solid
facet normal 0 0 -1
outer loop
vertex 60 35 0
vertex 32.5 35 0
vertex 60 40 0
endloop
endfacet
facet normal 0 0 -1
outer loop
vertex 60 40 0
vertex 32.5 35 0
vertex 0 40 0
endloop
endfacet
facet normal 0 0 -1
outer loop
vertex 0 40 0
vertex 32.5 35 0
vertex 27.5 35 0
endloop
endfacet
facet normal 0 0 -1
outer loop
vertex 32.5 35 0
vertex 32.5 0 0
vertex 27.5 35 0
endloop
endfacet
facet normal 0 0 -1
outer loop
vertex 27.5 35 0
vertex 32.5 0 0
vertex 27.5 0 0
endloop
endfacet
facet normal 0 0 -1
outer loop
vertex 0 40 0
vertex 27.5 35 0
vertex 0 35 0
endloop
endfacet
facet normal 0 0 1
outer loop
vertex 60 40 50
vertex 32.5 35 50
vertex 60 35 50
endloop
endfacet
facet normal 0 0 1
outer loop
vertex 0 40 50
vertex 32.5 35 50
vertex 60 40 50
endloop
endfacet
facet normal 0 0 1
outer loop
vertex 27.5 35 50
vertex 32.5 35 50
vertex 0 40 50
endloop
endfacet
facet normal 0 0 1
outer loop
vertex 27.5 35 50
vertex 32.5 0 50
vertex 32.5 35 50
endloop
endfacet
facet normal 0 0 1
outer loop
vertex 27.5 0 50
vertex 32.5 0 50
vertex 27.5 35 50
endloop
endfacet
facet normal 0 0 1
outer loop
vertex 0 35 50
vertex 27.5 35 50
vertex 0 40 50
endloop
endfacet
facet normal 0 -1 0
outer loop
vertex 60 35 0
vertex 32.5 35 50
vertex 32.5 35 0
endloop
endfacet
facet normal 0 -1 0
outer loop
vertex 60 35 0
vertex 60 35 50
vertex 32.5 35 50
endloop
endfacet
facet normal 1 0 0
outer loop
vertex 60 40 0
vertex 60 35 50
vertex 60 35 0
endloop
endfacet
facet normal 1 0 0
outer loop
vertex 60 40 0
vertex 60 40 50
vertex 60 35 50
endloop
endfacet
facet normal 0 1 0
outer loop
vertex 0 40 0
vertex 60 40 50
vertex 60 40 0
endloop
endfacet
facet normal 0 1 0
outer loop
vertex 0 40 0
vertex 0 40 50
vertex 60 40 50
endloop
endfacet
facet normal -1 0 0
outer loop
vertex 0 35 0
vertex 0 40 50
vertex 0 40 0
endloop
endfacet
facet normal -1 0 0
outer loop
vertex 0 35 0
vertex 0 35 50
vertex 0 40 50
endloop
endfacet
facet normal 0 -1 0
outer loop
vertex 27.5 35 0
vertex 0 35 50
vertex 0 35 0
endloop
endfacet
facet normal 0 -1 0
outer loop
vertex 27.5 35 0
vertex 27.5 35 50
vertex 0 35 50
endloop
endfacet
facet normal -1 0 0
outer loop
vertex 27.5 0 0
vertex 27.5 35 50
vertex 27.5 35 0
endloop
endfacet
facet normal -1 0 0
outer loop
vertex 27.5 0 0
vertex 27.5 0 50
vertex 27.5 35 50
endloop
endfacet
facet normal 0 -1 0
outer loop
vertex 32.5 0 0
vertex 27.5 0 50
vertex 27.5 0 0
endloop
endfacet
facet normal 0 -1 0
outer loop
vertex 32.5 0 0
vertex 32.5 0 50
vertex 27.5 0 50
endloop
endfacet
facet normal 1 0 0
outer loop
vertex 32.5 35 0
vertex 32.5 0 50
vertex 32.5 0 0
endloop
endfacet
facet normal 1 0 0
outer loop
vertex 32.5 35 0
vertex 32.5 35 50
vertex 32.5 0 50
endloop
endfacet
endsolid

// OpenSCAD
$fn = 32;

// ----------------------------------------------------------------------
// Structural section: tee 60 x 40 mm
// ----------------------------------------------------------------------

// --- parameters (mm) ---
sec_w = 60;               // tee width, X
sec_h = 40;               // tee height, Y
flange_t = 5;             // top flange thickness
web_t = 5;                // web thickness
plate_t = 50;             // cut length, Z (extrusion height)

profile = [[27.5, 0], [32.5, 0], [32.5, 35], [60, 35], [60, 40], [0, 40], [0, 35], [27.5, 35]];  // primary outline, 8 points, counter clockwise

// --- the one profile operation ---
linear_extrude(height = plate_t) polygon(points = profile);
